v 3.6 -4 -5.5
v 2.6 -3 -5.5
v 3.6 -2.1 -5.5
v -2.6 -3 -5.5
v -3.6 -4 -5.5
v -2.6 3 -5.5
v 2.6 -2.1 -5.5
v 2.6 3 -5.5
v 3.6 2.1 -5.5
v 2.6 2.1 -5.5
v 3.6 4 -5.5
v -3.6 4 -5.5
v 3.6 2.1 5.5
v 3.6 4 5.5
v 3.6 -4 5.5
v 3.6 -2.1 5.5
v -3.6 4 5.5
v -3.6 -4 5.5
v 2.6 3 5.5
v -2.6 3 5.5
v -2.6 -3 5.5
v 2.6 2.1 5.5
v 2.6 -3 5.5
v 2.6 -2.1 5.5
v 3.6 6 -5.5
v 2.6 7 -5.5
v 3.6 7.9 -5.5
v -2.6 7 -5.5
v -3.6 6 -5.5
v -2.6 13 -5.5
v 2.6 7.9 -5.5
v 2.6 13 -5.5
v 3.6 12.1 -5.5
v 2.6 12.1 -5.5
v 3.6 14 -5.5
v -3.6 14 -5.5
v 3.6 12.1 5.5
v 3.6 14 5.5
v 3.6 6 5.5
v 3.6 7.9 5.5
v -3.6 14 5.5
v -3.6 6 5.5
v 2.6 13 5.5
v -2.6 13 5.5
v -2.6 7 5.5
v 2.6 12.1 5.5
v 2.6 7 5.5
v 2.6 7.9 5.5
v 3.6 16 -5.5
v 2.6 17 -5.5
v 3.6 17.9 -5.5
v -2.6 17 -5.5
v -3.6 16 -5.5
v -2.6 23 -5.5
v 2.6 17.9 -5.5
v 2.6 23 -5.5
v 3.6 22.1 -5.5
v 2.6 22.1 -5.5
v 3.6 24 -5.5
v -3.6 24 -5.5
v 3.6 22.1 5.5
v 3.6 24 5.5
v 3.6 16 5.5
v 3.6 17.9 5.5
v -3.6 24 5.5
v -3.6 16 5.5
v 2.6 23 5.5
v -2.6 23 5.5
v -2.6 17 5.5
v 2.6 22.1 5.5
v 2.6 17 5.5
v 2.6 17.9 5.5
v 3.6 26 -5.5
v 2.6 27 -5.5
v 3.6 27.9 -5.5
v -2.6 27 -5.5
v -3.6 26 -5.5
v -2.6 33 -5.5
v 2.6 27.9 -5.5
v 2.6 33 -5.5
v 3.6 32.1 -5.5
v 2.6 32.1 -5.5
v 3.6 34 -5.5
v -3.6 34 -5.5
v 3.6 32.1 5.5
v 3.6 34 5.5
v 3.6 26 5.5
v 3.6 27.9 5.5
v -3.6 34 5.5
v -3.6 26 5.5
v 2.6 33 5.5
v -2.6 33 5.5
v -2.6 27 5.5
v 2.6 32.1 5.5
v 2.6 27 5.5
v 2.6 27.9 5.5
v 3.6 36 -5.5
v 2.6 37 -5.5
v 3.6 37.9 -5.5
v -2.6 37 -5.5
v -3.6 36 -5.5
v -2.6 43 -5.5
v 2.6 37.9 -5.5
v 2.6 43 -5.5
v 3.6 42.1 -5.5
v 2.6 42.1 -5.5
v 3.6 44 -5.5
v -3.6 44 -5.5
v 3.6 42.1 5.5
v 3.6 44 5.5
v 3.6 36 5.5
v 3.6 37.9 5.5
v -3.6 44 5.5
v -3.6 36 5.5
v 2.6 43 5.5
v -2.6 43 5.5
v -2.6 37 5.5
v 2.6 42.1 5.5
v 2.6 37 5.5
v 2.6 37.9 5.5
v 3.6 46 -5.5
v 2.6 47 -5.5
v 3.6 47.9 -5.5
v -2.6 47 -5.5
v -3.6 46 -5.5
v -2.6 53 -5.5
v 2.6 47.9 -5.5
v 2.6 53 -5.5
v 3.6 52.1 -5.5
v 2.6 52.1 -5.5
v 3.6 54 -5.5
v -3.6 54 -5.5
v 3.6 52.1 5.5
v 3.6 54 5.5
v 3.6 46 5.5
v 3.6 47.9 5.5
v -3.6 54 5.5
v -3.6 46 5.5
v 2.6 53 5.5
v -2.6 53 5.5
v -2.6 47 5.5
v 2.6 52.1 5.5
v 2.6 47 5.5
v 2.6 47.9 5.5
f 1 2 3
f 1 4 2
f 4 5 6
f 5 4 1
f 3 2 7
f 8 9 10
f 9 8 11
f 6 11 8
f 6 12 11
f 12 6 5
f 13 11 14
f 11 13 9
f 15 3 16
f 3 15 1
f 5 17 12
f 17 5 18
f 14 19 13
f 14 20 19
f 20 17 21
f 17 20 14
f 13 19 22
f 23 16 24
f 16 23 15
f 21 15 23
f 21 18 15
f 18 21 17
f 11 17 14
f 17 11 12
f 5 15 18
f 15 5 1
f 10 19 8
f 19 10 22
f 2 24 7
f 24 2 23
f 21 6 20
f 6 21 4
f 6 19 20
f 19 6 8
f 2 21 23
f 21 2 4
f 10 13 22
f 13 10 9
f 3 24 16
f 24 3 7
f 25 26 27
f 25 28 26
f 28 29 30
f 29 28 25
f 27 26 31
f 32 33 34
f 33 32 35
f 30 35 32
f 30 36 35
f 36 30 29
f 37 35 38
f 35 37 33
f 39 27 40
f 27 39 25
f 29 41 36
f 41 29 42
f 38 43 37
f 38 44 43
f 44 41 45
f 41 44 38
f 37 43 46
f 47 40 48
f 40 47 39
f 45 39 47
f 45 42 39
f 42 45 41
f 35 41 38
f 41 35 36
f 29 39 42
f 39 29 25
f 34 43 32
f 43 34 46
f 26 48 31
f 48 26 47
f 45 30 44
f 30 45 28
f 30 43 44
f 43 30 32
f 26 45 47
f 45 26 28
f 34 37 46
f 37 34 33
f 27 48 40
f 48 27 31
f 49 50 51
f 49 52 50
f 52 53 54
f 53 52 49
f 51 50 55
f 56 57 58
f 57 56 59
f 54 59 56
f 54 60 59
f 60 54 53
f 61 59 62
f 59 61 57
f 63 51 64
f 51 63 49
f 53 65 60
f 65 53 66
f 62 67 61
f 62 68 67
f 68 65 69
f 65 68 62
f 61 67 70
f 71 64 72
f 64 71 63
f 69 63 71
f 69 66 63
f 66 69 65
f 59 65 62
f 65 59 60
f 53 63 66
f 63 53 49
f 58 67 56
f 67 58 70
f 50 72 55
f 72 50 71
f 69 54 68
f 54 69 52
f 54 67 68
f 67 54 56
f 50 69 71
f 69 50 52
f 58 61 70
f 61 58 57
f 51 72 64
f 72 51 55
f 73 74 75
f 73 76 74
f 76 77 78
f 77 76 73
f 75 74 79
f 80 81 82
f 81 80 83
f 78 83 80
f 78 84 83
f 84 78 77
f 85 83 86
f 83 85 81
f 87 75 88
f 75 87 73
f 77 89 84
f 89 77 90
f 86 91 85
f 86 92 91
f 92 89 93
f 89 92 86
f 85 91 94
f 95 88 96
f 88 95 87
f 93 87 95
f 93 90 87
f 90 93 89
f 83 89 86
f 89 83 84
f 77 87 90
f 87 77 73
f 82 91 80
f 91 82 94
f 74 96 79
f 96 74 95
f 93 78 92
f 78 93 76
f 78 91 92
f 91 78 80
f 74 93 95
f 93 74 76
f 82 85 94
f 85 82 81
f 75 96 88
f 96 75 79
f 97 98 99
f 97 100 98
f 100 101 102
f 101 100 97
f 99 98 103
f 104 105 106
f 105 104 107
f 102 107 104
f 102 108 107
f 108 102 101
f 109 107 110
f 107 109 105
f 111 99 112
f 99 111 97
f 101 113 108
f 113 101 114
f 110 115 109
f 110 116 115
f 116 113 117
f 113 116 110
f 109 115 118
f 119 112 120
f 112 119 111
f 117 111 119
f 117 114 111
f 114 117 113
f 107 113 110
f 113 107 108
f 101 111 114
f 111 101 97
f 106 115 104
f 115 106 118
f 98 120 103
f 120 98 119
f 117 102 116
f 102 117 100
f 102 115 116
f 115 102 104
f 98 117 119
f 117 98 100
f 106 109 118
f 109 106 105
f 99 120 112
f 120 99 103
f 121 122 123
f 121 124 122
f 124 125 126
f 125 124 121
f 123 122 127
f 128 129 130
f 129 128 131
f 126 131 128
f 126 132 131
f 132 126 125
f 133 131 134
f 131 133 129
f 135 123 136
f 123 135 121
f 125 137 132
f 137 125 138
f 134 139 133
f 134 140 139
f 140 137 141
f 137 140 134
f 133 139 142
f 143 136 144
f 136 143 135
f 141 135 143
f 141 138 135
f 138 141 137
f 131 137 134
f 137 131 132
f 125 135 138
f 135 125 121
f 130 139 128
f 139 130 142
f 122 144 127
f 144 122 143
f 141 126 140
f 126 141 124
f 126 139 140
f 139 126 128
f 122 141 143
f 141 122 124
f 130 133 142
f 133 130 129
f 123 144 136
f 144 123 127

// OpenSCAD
/*
 * clips for the shelf cover halfs
 */

$fn=60;
thickness = 1.0;

inside_clip_length = 11;
inside_clip_width = 6;
inside_clip_height = 5.2;

clip_length = inside_clip_length;
clip_width = inside_clip_width + 2*thickness;
clip_height = inside_clip_height + 2*thickness;

module clip_cube() {
   cube([clip_length, clip_width, clip_height], center=true);
}

module clip_cutout() {
   cube([inside_clip_length+3, inside_clip_width, inside_clip_height], center=true);
}

module clip_break() {
   height = thickness+3;
   translate([0, 0, (inside_clip_height+2*thickness)/2]) {
      cube([inside_clip_length+3, inside_clip_width*0.7, height], center=true);
   }
}

module clip() {
   rotate([0, 90, 0]) {
      difference() {
         clip_cube();
         clip_cutout();
         clip_break();
      }
   }
}

for(spacing = [0 : 10 : 50]) {
   translate([0,  spacing, 0]) {
      clip();
   }
}
